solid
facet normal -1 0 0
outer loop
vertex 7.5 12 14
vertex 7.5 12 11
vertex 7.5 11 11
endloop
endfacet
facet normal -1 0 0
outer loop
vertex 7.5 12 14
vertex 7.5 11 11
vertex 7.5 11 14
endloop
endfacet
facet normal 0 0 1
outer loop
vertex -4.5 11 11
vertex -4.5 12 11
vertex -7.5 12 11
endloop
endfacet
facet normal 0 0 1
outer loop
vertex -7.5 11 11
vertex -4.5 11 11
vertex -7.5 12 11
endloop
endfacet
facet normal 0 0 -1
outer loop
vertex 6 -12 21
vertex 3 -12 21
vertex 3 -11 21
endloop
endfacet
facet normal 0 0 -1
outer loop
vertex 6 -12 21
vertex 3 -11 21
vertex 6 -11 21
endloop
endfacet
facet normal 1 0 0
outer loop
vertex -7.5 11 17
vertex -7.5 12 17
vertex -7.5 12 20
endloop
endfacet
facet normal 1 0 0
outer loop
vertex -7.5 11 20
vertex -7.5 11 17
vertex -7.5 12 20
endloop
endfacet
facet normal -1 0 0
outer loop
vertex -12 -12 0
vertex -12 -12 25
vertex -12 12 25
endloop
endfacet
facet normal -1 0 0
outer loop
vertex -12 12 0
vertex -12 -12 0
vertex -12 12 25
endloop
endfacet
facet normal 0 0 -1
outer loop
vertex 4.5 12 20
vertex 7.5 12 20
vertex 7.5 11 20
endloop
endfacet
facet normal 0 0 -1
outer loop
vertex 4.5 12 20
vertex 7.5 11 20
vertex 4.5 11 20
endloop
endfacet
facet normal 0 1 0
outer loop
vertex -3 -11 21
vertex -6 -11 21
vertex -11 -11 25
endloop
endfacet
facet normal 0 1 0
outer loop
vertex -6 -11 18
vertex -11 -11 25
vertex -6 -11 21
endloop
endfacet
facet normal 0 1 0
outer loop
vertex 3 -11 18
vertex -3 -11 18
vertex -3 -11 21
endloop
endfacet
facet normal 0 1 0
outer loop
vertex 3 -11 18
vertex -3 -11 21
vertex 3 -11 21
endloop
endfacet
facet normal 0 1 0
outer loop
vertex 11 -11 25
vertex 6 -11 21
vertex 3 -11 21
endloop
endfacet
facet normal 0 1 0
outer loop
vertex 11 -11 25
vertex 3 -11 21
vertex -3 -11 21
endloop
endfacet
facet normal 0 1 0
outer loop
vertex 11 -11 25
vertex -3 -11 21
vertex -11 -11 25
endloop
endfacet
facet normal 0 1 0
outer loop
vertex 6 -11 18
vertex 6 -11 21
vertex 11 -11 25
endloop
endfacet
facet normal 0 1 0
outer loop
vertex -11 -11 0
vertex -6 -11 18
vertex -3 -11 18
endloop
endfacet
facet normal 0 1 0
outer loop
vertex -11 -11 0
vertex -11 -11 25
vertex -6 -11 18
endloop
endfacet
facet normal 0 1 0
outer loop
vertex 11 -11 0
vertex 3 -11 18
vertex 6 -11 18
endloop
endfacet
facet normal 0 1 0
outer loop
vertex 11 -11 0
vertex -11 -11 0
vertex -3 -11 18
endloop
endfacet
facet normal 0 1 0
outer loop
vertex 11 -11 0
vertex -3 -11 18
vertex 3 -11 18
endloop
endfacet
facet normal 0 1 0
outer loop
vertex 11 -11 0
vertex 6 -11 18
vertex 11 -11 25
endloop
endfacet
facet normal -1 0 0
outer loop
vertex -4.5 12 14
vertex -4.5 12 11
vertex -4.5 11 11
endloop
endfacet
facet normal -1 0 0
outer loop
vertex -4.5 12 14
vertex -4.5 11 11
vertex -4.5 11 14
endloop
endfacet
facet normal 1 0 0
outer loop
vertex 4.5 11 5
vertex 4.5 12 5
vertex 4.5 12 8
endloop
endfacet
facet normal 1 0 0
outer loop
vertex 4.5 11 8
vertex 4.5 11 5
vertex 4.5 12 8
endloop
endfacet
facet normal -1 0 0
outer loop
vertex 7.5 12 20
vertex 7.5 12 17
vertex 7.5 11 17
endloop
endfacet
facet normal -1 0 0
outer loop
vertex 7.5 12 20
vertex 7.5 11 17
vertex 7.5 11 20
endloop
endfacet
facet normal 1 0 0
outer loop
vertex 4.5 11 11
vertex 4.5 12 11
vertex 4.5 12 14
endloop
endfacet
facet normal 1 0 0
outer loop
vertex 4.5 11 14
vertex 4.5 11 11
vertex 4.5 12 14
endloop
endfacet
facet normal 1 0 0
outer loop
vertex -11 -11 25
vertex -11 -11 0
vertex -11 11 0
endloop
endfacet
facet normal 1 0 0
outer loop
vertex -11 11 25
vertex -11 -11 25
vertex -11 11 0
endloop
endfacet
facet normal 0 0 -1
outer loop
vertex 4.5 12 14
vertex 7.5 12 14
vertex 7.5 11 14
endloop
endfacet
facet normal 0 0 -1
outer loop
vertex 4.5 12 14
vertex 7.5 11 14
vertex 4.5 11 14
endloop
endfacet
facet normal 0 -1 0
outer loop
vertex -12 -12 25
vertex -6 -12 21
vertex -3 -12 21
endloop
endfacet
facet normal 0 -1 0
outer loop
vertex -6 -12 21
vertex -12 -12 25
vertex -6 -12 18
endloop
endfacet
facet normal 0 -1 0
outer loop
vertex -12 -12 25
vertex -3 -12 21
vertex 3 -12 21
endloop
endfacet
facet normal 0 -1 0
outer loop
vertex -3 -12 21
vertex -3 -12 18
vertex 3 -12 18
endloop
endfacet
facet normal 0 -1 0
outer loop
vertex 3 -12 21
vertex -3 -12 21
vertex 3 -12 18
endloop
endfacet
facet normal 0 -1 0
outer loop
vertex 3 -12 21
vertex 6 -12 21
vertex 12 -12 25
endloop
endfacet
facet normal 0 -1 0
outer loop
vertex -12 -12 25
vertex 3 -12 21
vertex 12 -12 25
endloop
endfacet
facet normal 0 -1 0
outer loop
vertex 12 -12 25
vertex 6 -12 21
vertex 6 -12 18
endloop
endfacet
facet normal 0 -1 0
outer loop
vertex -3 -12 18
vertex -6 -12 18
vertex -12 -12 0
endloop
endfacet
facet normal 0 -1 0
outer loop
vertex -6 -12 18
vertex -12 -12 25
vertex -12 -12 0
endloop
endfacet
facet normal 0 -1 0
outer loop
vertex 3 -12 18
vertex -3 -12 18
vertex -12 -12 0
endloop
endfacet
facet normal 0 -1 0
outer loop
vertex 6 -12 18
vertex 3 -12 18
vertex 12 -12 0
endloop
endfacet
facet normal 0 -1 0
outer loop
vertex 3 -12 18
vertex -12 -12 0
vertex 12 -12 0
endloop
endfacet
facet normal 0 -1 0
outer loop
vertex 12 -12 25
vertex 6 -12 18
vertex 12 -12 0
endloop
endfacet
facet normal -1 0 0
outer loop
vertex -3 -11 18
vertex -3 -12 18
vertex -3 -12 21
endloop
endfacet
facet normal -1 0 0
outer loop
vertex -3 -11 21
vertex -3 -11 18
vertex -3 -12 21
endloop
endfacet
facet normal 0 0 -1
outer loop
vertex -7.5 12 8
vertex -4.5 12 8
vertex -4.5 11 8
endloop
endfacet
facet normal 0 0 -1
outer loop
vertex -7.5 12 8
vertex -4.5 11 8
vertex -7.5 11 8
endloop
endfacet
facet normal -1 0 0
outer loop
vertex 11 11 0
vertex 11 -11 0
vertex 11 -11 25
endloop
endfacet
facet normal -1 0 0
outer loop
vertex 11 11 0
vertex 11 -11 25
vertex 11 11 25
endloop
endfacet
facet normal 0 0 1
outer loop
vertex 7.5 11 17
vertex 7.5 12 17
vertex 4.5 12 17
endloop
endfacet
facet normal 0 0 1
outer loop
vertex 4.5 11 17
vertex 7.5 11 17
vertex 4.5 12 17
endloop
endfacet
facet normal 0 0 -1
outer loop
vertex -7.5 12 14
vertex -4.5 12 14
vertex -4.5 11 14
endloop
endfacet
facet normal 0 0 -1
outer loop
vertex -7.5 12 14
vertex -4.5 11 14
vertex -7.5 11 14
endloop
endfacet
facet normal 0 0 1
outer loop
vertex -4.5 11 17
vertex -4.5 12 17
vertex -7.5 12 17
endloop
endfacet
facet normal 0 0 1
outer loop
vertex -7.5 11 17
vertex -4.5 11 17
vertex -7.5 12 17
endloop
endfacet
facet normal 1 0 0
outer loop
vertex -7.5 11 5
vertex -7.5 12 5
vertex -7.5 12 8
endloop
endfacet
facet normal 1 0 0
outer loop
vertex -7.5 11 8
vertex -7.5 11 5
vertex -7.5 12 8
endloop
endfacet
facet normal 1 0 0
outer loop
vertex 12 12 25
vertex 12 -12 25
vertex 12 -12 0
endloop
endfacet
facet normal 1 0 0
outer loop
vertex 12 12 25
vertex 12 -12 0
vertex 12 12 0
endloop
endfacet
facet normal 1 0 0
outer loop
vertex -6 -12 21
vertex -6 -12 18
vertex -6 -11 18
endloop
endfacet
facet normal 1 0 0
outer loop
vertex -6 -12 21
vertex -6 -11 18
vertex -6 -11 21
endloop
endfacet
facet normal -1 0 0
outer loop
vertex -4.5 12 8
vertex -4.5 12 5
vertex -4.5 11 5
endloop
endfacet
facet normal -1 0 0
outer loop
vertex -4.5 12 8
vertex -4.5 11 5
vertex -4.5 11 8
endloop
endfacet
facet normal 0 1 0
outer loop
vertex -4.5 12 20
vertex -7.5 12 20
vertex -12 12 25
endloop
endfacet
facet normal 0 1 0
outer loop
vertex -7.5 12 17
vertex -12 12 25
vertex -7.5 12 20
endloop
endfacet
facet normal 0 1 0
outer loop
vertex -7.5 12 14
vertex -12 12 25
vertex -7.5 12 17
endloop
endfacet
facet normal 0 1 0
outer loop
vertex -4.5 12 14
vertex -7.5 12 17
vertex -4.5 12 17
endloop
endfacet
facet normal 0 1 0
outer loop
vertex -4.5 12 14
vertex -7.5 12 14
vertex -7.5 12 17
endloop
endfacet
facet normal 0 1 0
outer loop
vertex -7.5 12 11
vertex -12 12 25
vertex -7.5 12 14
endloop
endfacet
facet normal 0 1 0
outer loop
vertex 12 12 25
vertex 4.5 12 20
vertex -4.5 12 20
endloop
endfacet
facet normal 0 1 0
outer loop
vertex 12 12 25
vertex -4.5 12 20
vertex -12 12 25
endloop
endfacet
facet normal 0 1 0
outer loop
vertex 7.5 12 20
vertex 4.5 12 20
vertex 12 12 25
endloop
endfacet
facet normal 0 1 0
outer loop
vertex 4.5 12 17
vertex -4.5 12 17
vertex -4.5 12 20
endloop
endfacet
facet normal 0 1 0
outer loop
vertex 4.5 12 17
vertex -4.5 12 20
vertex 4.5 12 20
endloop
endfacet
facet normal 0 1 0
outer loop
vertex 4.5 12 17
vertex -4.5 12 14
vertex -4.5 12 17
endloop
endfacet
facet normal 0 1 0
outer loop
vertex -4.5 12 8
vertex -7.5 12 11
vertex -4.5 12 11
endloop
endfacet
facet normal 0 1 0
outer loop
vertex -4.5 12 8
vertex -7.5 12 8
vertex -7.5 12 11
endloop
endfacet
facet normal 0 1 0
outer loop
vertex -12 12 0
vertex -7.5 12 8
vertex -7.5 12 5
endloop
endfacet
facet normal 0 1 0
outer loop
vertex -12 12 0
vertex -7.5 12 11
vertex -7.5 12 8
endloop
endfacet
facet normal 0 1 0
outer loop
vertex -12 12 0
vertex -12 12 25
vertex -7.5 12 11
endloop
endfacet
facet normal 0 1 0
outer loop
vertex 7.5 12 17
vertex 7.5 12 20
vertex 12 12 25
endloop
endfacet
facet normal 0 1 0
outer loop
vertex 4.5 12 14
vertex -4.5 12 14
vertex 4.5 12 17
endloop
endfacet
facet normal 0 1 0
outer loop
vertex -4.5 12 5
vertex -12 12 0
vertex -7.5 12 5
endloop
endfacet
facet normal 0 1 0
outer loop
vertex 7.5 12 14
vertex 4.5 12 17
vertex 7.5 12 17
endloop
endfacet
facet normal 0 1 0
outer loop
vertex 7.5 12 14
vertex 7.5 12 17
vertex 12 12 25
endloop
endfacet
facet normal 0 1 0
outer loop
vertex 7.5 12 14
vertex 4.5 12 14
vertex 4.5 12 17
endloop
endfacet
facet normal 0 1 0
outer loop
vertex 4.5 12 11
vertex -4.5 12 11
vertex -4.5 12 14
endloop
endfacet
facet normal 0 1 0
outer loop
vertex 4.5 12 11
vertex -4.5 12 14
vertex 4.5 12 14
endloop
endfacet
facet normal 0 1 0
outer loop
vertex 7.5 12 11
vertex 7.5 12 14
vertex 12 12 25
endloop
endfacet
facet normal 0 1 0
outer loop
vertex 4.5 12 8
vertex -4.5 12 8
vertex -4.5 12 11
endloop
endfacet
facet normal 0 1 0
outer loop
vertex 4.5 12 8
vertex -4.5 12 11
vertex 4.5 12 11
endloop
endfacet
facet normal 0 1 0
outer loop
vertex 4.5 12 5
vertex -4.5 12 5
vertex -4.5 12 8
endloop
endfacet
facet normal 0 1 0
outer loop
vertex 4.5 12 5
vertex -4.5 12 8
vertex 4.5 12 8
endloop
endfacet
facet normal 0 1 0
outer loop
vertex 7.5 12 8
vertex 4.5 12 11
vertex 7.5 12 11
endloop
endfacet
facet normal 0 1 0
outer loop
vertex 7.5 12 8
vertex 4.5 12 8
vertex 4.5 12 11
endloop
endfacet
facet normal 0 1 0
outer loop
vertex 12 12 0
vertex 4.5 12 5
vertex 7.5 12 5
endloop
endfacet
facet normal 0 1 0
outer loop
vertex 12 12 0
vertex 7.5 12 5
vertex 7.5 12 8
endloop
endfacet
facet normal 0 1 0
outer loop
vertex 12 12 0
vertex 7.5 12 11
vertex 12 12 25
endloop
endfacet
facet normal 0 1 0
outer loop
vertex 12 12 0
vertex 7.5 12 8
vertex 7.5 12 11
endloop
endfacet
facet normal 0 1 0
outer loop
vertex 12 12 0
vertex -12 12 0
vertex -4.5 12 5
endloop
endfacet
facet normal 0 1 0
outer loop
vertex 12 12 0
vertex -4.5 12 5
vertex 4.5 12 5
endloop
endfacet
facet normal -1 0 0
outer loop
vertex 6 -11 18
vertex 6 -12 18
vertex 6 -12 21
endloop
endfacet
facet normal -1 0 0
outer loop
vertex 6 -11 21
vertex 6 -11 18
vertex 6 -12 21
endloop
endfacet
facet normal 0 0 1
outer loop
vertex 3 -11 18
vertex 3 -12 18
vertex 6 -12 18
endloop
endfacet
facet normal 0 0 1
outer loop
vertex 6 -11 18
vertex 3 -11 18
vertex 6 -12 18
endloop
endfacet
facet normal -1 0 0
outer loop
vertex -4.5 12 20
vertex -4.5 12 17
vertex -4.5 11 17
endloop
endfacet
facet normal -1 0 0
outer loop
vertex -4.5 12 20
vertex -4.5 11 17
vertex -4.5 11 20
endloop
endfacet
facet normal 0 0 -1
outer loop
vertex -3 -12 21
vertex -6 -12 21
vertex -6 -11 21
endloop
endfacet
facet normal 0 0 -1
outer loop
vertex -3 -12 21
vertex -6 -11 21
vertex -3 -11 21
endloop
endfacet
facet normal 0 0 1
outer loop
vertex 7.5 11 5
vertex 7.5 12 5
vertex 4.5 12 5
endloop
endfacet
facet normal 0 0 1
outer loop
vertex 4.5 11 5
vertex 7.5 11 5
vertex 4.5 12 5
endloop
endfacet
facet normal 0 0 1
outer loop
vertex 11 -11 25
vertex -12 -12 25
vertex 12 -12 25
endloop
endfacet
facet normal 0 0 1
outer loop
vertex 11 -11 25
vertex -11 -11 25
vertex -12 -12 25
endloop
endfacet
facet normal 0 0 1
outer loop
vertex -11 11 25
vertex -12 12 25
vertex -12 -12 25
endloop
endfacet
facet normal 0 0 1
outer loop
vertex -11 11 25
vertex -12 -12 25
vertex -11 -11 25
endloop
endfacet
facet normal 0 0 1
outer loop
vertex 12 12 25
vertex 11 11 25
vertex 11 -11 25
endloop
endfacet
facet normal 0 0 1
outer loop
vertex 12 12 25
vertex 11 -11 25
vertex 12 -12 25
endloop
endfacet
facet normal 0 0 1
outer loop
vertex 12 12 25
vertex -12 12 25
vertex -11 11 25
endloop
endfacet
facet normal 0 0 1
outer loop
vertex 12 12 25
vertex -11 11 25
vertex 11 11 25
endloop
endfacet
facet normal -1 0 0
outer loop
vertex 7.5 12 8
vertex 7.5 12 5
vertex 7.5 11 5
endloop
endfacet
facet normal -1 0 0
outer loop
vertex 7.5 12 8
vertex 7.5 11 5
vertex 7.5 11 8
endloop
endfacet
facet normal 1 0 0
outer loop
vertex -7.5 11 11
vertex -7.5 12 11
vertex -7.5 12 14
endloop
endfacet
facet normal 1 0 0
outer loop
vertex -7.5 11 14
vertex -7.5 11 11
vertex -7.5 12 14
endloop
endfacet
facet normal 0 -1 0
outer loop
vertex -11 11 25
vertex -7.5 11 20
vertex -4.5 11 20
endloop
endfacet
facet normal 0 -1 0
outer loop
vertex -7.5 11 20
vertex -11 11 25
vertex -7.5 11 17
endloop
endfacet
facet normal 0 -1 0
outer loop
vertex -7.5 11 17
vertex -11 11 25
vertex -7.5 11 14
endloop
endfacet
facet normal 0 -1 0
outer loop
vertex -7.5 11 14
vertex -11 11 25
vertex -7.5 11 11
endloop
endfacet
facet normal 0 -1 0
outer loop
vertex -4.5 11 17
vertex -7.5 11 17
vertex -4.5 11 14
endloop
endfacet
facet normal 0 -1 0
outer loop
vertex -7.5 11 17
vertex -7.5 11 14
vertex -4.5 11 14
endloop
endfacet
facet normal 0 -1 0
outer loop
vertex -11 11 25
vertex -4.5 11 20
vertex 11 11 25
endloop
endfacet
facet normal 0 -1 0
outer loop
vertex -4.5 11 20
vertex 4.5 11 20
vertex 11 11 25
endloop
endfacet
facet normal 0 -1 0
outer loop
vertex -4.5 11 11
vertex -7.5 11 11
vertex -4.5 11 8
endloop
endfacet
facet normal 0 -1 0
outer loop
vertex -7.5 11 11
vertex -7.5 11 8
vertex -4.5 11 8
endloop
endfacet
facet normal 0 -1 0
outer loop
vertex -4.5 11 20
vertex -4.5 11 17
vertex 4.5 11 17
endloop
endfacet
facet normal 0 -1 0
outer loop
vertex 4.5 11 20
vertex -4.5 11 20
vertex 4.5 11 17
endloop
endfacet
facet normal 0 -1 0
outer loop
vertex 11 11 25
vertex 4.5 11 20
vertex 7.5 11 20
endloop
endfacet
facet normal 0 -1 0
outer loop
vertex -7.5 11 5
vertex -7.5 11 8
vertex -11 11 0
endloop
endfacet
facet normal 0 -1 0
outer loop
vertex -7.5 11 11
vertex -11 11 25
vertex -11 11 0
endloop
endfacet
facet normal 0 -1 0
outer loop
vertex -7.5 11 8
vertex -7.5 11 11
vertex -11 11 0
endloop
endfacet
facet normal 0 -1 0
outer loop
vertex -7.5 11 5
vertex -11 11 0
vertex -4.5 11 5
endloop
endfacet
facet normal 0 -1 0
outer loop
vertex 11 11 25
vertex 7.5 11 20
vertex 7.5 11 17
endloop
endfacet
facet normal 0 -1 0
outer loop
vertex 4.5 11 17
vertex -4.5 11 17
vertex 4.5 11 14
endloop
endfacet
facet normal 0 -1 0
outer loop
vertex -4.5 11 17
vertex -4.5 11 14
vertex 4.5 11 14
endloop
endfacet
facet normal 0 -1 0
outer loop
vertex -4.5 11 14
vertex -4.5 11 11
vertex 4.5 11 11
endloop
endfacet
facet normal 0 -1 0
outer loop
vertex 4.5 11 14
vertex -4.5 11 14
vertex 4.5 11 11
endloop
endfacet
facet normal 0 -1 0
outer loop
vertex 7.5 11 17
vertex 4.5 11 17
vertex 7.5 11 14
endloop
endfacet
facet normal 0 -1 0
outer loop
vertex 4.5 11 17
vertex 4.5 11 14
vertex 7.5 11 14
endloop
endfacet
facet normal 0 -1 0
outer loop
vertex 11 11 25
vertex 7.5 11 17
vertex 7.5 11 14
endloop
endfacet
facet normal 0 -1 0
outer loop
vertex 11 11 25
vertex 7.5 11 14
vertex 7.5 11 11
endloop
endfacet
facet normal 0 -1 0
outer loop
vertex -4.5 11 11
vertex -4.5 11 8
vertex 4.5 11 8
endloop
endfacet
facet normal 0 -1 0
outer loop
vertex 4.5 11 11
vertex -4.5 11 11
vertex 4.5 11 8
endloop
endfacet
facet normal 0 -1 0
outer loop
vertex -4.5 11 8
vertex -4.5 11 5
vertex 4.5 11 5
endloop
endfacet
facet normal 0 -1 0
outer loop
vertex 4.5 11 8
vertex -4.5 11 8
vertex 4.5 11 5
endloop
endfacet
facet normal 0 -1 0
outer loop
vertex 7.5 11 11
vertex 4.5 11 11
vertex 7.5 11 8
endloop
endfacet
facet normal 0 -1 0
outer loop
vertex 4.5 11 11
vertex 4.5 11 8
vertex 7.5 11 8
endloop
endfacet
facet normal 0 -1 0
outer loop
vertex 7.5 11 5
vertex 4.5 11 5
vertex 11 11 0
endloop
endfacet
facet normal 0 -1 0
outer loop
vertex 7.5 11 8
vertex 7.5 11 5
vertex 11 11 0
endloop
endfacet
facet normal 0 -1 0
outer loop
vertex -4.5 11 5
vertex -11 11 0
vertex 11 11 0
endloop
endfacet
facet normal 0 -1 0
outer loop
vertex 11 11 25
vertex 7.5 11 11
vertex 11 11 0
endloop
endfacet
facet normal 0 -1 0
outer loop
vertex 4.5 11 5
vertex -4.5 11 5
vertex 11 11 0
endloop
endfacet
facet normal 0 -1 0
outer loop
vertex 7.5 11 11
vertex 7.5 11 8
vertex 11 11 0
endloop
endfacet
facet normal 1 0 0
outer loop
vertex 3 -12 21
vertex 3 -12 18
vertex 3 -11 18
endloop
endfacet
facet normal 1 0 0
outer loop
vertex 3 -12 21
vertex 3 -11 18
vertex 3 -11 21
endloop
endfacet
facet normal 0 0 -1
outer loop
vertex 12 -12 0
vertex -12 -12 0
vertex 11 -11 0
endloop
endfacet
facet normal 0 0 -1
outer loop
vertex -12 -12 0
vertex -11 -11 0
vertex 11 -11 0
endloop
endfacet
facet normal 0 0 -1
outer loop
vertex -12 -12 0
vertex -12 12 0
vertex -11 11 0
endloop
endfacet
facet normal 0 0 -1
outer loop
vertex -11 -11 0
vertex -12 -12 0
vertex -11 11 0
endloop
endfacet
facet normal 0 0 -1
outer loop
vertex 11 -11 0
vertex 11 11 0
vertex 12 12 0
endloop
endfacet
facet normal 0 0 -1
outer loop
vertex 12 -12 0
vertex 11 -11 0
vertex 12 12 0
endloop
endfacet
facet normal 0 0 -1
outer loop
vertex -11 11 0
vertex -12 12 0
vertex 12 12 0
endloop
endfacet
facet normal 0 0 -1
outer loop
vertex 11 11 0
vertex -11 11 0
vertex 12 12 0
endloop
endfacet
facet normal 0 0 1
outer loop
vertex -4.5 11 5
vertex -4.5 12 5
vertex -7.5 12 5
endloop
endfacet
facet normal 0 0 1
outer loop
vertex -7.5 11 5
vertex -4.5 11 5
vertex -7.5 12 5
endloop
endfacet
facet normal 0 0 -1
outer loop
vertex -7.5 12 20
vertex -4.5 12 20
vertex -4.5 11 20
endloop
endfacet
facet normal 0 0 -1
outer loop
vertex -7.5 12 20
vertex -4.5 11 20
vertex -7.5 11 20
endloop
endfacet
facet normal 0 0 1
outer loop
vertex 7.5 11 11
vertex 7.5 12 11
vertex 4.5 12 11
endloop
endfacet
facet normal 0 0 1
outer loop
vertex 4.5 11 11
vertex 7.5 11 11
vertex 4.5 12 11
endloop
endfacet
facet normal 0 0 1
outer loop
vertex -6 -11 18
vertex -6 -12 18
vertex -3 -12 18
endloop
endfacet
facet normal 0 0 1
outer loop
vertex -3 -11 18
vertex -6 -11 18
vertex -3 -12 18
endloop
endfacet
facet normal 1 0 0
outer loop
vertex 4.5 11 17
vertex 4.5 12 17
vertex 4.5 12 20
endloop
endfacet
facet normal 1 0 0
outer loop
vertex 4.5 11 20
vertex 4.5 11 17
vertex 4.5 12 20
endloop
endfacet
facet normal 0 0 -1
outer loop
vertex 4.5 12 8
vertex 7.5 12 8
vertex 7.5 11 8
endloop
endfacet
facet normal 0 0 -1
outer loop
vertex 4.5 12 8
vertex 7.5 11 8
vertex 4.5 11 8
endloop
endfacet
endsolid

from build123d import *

# Parameters (mm, degrees)
F0_W     = 24
F0_H     = 24
F0_W_2   = 22
F0_H_2   = 22
F1_DEPTH = 25
F2_W     = 3
F2_H     = 3
F3_DEPTH = 1
F4_W     = 3
F4_H     = 3
F5_DEPTH = 1


with BuildPart() as f1:
    # F0 (on Top) → F1 (new body)
    with BuildSketch(Plane.XY):
        Rectangle(F0_W, F0_H)
        Rectangle(F0_W_2, F0_H_2, mode=Mode.SUBTRACT)
    extrude(amount=F1_DEPTH)

    # F2 (on face) → F3 (cut, through all)
    with BuildSketch(Plane.XZ.offset(12)):
        with Locations((-4.5, 19.5)):
            Rectangle(F2_W, F2_H)
        with Locations((4.5, 19.5)):
            Rectangle(F2_W, F2_H)
    extrude(amount=-F3_DEPTH, mode=Mode.SUBTRACT)

    # F4 (on face) → F5 (cut, through all)
    with BuildSketch(Plane(origin=(0, 12, 0), x_dir=(-1, 0, 0), z_dir=(0, 1, 0))):
        with Locations((-6, 6.5)):
            Rectangle(F4_W, F4_H)
        with Locations((-6, 12.5)):
            Rectangle(F4_W, F4_H)
        with Locations((-6, 18.5)):
            Rectangle(F4_W, F4_H)
        with Locations((6, 18.5)):
            Rectangle(F4_W, F4_H)
        with Locations((6, 12.5)):
            Rectangle(F4_W, F4_H)
        with Locations((6, 6.5)):
            Rectangle(F4_W, F4_H)
    extrude(amount=-F5_DEPTH, mode=Mode.SUBTRACT)


solid = f1.part
